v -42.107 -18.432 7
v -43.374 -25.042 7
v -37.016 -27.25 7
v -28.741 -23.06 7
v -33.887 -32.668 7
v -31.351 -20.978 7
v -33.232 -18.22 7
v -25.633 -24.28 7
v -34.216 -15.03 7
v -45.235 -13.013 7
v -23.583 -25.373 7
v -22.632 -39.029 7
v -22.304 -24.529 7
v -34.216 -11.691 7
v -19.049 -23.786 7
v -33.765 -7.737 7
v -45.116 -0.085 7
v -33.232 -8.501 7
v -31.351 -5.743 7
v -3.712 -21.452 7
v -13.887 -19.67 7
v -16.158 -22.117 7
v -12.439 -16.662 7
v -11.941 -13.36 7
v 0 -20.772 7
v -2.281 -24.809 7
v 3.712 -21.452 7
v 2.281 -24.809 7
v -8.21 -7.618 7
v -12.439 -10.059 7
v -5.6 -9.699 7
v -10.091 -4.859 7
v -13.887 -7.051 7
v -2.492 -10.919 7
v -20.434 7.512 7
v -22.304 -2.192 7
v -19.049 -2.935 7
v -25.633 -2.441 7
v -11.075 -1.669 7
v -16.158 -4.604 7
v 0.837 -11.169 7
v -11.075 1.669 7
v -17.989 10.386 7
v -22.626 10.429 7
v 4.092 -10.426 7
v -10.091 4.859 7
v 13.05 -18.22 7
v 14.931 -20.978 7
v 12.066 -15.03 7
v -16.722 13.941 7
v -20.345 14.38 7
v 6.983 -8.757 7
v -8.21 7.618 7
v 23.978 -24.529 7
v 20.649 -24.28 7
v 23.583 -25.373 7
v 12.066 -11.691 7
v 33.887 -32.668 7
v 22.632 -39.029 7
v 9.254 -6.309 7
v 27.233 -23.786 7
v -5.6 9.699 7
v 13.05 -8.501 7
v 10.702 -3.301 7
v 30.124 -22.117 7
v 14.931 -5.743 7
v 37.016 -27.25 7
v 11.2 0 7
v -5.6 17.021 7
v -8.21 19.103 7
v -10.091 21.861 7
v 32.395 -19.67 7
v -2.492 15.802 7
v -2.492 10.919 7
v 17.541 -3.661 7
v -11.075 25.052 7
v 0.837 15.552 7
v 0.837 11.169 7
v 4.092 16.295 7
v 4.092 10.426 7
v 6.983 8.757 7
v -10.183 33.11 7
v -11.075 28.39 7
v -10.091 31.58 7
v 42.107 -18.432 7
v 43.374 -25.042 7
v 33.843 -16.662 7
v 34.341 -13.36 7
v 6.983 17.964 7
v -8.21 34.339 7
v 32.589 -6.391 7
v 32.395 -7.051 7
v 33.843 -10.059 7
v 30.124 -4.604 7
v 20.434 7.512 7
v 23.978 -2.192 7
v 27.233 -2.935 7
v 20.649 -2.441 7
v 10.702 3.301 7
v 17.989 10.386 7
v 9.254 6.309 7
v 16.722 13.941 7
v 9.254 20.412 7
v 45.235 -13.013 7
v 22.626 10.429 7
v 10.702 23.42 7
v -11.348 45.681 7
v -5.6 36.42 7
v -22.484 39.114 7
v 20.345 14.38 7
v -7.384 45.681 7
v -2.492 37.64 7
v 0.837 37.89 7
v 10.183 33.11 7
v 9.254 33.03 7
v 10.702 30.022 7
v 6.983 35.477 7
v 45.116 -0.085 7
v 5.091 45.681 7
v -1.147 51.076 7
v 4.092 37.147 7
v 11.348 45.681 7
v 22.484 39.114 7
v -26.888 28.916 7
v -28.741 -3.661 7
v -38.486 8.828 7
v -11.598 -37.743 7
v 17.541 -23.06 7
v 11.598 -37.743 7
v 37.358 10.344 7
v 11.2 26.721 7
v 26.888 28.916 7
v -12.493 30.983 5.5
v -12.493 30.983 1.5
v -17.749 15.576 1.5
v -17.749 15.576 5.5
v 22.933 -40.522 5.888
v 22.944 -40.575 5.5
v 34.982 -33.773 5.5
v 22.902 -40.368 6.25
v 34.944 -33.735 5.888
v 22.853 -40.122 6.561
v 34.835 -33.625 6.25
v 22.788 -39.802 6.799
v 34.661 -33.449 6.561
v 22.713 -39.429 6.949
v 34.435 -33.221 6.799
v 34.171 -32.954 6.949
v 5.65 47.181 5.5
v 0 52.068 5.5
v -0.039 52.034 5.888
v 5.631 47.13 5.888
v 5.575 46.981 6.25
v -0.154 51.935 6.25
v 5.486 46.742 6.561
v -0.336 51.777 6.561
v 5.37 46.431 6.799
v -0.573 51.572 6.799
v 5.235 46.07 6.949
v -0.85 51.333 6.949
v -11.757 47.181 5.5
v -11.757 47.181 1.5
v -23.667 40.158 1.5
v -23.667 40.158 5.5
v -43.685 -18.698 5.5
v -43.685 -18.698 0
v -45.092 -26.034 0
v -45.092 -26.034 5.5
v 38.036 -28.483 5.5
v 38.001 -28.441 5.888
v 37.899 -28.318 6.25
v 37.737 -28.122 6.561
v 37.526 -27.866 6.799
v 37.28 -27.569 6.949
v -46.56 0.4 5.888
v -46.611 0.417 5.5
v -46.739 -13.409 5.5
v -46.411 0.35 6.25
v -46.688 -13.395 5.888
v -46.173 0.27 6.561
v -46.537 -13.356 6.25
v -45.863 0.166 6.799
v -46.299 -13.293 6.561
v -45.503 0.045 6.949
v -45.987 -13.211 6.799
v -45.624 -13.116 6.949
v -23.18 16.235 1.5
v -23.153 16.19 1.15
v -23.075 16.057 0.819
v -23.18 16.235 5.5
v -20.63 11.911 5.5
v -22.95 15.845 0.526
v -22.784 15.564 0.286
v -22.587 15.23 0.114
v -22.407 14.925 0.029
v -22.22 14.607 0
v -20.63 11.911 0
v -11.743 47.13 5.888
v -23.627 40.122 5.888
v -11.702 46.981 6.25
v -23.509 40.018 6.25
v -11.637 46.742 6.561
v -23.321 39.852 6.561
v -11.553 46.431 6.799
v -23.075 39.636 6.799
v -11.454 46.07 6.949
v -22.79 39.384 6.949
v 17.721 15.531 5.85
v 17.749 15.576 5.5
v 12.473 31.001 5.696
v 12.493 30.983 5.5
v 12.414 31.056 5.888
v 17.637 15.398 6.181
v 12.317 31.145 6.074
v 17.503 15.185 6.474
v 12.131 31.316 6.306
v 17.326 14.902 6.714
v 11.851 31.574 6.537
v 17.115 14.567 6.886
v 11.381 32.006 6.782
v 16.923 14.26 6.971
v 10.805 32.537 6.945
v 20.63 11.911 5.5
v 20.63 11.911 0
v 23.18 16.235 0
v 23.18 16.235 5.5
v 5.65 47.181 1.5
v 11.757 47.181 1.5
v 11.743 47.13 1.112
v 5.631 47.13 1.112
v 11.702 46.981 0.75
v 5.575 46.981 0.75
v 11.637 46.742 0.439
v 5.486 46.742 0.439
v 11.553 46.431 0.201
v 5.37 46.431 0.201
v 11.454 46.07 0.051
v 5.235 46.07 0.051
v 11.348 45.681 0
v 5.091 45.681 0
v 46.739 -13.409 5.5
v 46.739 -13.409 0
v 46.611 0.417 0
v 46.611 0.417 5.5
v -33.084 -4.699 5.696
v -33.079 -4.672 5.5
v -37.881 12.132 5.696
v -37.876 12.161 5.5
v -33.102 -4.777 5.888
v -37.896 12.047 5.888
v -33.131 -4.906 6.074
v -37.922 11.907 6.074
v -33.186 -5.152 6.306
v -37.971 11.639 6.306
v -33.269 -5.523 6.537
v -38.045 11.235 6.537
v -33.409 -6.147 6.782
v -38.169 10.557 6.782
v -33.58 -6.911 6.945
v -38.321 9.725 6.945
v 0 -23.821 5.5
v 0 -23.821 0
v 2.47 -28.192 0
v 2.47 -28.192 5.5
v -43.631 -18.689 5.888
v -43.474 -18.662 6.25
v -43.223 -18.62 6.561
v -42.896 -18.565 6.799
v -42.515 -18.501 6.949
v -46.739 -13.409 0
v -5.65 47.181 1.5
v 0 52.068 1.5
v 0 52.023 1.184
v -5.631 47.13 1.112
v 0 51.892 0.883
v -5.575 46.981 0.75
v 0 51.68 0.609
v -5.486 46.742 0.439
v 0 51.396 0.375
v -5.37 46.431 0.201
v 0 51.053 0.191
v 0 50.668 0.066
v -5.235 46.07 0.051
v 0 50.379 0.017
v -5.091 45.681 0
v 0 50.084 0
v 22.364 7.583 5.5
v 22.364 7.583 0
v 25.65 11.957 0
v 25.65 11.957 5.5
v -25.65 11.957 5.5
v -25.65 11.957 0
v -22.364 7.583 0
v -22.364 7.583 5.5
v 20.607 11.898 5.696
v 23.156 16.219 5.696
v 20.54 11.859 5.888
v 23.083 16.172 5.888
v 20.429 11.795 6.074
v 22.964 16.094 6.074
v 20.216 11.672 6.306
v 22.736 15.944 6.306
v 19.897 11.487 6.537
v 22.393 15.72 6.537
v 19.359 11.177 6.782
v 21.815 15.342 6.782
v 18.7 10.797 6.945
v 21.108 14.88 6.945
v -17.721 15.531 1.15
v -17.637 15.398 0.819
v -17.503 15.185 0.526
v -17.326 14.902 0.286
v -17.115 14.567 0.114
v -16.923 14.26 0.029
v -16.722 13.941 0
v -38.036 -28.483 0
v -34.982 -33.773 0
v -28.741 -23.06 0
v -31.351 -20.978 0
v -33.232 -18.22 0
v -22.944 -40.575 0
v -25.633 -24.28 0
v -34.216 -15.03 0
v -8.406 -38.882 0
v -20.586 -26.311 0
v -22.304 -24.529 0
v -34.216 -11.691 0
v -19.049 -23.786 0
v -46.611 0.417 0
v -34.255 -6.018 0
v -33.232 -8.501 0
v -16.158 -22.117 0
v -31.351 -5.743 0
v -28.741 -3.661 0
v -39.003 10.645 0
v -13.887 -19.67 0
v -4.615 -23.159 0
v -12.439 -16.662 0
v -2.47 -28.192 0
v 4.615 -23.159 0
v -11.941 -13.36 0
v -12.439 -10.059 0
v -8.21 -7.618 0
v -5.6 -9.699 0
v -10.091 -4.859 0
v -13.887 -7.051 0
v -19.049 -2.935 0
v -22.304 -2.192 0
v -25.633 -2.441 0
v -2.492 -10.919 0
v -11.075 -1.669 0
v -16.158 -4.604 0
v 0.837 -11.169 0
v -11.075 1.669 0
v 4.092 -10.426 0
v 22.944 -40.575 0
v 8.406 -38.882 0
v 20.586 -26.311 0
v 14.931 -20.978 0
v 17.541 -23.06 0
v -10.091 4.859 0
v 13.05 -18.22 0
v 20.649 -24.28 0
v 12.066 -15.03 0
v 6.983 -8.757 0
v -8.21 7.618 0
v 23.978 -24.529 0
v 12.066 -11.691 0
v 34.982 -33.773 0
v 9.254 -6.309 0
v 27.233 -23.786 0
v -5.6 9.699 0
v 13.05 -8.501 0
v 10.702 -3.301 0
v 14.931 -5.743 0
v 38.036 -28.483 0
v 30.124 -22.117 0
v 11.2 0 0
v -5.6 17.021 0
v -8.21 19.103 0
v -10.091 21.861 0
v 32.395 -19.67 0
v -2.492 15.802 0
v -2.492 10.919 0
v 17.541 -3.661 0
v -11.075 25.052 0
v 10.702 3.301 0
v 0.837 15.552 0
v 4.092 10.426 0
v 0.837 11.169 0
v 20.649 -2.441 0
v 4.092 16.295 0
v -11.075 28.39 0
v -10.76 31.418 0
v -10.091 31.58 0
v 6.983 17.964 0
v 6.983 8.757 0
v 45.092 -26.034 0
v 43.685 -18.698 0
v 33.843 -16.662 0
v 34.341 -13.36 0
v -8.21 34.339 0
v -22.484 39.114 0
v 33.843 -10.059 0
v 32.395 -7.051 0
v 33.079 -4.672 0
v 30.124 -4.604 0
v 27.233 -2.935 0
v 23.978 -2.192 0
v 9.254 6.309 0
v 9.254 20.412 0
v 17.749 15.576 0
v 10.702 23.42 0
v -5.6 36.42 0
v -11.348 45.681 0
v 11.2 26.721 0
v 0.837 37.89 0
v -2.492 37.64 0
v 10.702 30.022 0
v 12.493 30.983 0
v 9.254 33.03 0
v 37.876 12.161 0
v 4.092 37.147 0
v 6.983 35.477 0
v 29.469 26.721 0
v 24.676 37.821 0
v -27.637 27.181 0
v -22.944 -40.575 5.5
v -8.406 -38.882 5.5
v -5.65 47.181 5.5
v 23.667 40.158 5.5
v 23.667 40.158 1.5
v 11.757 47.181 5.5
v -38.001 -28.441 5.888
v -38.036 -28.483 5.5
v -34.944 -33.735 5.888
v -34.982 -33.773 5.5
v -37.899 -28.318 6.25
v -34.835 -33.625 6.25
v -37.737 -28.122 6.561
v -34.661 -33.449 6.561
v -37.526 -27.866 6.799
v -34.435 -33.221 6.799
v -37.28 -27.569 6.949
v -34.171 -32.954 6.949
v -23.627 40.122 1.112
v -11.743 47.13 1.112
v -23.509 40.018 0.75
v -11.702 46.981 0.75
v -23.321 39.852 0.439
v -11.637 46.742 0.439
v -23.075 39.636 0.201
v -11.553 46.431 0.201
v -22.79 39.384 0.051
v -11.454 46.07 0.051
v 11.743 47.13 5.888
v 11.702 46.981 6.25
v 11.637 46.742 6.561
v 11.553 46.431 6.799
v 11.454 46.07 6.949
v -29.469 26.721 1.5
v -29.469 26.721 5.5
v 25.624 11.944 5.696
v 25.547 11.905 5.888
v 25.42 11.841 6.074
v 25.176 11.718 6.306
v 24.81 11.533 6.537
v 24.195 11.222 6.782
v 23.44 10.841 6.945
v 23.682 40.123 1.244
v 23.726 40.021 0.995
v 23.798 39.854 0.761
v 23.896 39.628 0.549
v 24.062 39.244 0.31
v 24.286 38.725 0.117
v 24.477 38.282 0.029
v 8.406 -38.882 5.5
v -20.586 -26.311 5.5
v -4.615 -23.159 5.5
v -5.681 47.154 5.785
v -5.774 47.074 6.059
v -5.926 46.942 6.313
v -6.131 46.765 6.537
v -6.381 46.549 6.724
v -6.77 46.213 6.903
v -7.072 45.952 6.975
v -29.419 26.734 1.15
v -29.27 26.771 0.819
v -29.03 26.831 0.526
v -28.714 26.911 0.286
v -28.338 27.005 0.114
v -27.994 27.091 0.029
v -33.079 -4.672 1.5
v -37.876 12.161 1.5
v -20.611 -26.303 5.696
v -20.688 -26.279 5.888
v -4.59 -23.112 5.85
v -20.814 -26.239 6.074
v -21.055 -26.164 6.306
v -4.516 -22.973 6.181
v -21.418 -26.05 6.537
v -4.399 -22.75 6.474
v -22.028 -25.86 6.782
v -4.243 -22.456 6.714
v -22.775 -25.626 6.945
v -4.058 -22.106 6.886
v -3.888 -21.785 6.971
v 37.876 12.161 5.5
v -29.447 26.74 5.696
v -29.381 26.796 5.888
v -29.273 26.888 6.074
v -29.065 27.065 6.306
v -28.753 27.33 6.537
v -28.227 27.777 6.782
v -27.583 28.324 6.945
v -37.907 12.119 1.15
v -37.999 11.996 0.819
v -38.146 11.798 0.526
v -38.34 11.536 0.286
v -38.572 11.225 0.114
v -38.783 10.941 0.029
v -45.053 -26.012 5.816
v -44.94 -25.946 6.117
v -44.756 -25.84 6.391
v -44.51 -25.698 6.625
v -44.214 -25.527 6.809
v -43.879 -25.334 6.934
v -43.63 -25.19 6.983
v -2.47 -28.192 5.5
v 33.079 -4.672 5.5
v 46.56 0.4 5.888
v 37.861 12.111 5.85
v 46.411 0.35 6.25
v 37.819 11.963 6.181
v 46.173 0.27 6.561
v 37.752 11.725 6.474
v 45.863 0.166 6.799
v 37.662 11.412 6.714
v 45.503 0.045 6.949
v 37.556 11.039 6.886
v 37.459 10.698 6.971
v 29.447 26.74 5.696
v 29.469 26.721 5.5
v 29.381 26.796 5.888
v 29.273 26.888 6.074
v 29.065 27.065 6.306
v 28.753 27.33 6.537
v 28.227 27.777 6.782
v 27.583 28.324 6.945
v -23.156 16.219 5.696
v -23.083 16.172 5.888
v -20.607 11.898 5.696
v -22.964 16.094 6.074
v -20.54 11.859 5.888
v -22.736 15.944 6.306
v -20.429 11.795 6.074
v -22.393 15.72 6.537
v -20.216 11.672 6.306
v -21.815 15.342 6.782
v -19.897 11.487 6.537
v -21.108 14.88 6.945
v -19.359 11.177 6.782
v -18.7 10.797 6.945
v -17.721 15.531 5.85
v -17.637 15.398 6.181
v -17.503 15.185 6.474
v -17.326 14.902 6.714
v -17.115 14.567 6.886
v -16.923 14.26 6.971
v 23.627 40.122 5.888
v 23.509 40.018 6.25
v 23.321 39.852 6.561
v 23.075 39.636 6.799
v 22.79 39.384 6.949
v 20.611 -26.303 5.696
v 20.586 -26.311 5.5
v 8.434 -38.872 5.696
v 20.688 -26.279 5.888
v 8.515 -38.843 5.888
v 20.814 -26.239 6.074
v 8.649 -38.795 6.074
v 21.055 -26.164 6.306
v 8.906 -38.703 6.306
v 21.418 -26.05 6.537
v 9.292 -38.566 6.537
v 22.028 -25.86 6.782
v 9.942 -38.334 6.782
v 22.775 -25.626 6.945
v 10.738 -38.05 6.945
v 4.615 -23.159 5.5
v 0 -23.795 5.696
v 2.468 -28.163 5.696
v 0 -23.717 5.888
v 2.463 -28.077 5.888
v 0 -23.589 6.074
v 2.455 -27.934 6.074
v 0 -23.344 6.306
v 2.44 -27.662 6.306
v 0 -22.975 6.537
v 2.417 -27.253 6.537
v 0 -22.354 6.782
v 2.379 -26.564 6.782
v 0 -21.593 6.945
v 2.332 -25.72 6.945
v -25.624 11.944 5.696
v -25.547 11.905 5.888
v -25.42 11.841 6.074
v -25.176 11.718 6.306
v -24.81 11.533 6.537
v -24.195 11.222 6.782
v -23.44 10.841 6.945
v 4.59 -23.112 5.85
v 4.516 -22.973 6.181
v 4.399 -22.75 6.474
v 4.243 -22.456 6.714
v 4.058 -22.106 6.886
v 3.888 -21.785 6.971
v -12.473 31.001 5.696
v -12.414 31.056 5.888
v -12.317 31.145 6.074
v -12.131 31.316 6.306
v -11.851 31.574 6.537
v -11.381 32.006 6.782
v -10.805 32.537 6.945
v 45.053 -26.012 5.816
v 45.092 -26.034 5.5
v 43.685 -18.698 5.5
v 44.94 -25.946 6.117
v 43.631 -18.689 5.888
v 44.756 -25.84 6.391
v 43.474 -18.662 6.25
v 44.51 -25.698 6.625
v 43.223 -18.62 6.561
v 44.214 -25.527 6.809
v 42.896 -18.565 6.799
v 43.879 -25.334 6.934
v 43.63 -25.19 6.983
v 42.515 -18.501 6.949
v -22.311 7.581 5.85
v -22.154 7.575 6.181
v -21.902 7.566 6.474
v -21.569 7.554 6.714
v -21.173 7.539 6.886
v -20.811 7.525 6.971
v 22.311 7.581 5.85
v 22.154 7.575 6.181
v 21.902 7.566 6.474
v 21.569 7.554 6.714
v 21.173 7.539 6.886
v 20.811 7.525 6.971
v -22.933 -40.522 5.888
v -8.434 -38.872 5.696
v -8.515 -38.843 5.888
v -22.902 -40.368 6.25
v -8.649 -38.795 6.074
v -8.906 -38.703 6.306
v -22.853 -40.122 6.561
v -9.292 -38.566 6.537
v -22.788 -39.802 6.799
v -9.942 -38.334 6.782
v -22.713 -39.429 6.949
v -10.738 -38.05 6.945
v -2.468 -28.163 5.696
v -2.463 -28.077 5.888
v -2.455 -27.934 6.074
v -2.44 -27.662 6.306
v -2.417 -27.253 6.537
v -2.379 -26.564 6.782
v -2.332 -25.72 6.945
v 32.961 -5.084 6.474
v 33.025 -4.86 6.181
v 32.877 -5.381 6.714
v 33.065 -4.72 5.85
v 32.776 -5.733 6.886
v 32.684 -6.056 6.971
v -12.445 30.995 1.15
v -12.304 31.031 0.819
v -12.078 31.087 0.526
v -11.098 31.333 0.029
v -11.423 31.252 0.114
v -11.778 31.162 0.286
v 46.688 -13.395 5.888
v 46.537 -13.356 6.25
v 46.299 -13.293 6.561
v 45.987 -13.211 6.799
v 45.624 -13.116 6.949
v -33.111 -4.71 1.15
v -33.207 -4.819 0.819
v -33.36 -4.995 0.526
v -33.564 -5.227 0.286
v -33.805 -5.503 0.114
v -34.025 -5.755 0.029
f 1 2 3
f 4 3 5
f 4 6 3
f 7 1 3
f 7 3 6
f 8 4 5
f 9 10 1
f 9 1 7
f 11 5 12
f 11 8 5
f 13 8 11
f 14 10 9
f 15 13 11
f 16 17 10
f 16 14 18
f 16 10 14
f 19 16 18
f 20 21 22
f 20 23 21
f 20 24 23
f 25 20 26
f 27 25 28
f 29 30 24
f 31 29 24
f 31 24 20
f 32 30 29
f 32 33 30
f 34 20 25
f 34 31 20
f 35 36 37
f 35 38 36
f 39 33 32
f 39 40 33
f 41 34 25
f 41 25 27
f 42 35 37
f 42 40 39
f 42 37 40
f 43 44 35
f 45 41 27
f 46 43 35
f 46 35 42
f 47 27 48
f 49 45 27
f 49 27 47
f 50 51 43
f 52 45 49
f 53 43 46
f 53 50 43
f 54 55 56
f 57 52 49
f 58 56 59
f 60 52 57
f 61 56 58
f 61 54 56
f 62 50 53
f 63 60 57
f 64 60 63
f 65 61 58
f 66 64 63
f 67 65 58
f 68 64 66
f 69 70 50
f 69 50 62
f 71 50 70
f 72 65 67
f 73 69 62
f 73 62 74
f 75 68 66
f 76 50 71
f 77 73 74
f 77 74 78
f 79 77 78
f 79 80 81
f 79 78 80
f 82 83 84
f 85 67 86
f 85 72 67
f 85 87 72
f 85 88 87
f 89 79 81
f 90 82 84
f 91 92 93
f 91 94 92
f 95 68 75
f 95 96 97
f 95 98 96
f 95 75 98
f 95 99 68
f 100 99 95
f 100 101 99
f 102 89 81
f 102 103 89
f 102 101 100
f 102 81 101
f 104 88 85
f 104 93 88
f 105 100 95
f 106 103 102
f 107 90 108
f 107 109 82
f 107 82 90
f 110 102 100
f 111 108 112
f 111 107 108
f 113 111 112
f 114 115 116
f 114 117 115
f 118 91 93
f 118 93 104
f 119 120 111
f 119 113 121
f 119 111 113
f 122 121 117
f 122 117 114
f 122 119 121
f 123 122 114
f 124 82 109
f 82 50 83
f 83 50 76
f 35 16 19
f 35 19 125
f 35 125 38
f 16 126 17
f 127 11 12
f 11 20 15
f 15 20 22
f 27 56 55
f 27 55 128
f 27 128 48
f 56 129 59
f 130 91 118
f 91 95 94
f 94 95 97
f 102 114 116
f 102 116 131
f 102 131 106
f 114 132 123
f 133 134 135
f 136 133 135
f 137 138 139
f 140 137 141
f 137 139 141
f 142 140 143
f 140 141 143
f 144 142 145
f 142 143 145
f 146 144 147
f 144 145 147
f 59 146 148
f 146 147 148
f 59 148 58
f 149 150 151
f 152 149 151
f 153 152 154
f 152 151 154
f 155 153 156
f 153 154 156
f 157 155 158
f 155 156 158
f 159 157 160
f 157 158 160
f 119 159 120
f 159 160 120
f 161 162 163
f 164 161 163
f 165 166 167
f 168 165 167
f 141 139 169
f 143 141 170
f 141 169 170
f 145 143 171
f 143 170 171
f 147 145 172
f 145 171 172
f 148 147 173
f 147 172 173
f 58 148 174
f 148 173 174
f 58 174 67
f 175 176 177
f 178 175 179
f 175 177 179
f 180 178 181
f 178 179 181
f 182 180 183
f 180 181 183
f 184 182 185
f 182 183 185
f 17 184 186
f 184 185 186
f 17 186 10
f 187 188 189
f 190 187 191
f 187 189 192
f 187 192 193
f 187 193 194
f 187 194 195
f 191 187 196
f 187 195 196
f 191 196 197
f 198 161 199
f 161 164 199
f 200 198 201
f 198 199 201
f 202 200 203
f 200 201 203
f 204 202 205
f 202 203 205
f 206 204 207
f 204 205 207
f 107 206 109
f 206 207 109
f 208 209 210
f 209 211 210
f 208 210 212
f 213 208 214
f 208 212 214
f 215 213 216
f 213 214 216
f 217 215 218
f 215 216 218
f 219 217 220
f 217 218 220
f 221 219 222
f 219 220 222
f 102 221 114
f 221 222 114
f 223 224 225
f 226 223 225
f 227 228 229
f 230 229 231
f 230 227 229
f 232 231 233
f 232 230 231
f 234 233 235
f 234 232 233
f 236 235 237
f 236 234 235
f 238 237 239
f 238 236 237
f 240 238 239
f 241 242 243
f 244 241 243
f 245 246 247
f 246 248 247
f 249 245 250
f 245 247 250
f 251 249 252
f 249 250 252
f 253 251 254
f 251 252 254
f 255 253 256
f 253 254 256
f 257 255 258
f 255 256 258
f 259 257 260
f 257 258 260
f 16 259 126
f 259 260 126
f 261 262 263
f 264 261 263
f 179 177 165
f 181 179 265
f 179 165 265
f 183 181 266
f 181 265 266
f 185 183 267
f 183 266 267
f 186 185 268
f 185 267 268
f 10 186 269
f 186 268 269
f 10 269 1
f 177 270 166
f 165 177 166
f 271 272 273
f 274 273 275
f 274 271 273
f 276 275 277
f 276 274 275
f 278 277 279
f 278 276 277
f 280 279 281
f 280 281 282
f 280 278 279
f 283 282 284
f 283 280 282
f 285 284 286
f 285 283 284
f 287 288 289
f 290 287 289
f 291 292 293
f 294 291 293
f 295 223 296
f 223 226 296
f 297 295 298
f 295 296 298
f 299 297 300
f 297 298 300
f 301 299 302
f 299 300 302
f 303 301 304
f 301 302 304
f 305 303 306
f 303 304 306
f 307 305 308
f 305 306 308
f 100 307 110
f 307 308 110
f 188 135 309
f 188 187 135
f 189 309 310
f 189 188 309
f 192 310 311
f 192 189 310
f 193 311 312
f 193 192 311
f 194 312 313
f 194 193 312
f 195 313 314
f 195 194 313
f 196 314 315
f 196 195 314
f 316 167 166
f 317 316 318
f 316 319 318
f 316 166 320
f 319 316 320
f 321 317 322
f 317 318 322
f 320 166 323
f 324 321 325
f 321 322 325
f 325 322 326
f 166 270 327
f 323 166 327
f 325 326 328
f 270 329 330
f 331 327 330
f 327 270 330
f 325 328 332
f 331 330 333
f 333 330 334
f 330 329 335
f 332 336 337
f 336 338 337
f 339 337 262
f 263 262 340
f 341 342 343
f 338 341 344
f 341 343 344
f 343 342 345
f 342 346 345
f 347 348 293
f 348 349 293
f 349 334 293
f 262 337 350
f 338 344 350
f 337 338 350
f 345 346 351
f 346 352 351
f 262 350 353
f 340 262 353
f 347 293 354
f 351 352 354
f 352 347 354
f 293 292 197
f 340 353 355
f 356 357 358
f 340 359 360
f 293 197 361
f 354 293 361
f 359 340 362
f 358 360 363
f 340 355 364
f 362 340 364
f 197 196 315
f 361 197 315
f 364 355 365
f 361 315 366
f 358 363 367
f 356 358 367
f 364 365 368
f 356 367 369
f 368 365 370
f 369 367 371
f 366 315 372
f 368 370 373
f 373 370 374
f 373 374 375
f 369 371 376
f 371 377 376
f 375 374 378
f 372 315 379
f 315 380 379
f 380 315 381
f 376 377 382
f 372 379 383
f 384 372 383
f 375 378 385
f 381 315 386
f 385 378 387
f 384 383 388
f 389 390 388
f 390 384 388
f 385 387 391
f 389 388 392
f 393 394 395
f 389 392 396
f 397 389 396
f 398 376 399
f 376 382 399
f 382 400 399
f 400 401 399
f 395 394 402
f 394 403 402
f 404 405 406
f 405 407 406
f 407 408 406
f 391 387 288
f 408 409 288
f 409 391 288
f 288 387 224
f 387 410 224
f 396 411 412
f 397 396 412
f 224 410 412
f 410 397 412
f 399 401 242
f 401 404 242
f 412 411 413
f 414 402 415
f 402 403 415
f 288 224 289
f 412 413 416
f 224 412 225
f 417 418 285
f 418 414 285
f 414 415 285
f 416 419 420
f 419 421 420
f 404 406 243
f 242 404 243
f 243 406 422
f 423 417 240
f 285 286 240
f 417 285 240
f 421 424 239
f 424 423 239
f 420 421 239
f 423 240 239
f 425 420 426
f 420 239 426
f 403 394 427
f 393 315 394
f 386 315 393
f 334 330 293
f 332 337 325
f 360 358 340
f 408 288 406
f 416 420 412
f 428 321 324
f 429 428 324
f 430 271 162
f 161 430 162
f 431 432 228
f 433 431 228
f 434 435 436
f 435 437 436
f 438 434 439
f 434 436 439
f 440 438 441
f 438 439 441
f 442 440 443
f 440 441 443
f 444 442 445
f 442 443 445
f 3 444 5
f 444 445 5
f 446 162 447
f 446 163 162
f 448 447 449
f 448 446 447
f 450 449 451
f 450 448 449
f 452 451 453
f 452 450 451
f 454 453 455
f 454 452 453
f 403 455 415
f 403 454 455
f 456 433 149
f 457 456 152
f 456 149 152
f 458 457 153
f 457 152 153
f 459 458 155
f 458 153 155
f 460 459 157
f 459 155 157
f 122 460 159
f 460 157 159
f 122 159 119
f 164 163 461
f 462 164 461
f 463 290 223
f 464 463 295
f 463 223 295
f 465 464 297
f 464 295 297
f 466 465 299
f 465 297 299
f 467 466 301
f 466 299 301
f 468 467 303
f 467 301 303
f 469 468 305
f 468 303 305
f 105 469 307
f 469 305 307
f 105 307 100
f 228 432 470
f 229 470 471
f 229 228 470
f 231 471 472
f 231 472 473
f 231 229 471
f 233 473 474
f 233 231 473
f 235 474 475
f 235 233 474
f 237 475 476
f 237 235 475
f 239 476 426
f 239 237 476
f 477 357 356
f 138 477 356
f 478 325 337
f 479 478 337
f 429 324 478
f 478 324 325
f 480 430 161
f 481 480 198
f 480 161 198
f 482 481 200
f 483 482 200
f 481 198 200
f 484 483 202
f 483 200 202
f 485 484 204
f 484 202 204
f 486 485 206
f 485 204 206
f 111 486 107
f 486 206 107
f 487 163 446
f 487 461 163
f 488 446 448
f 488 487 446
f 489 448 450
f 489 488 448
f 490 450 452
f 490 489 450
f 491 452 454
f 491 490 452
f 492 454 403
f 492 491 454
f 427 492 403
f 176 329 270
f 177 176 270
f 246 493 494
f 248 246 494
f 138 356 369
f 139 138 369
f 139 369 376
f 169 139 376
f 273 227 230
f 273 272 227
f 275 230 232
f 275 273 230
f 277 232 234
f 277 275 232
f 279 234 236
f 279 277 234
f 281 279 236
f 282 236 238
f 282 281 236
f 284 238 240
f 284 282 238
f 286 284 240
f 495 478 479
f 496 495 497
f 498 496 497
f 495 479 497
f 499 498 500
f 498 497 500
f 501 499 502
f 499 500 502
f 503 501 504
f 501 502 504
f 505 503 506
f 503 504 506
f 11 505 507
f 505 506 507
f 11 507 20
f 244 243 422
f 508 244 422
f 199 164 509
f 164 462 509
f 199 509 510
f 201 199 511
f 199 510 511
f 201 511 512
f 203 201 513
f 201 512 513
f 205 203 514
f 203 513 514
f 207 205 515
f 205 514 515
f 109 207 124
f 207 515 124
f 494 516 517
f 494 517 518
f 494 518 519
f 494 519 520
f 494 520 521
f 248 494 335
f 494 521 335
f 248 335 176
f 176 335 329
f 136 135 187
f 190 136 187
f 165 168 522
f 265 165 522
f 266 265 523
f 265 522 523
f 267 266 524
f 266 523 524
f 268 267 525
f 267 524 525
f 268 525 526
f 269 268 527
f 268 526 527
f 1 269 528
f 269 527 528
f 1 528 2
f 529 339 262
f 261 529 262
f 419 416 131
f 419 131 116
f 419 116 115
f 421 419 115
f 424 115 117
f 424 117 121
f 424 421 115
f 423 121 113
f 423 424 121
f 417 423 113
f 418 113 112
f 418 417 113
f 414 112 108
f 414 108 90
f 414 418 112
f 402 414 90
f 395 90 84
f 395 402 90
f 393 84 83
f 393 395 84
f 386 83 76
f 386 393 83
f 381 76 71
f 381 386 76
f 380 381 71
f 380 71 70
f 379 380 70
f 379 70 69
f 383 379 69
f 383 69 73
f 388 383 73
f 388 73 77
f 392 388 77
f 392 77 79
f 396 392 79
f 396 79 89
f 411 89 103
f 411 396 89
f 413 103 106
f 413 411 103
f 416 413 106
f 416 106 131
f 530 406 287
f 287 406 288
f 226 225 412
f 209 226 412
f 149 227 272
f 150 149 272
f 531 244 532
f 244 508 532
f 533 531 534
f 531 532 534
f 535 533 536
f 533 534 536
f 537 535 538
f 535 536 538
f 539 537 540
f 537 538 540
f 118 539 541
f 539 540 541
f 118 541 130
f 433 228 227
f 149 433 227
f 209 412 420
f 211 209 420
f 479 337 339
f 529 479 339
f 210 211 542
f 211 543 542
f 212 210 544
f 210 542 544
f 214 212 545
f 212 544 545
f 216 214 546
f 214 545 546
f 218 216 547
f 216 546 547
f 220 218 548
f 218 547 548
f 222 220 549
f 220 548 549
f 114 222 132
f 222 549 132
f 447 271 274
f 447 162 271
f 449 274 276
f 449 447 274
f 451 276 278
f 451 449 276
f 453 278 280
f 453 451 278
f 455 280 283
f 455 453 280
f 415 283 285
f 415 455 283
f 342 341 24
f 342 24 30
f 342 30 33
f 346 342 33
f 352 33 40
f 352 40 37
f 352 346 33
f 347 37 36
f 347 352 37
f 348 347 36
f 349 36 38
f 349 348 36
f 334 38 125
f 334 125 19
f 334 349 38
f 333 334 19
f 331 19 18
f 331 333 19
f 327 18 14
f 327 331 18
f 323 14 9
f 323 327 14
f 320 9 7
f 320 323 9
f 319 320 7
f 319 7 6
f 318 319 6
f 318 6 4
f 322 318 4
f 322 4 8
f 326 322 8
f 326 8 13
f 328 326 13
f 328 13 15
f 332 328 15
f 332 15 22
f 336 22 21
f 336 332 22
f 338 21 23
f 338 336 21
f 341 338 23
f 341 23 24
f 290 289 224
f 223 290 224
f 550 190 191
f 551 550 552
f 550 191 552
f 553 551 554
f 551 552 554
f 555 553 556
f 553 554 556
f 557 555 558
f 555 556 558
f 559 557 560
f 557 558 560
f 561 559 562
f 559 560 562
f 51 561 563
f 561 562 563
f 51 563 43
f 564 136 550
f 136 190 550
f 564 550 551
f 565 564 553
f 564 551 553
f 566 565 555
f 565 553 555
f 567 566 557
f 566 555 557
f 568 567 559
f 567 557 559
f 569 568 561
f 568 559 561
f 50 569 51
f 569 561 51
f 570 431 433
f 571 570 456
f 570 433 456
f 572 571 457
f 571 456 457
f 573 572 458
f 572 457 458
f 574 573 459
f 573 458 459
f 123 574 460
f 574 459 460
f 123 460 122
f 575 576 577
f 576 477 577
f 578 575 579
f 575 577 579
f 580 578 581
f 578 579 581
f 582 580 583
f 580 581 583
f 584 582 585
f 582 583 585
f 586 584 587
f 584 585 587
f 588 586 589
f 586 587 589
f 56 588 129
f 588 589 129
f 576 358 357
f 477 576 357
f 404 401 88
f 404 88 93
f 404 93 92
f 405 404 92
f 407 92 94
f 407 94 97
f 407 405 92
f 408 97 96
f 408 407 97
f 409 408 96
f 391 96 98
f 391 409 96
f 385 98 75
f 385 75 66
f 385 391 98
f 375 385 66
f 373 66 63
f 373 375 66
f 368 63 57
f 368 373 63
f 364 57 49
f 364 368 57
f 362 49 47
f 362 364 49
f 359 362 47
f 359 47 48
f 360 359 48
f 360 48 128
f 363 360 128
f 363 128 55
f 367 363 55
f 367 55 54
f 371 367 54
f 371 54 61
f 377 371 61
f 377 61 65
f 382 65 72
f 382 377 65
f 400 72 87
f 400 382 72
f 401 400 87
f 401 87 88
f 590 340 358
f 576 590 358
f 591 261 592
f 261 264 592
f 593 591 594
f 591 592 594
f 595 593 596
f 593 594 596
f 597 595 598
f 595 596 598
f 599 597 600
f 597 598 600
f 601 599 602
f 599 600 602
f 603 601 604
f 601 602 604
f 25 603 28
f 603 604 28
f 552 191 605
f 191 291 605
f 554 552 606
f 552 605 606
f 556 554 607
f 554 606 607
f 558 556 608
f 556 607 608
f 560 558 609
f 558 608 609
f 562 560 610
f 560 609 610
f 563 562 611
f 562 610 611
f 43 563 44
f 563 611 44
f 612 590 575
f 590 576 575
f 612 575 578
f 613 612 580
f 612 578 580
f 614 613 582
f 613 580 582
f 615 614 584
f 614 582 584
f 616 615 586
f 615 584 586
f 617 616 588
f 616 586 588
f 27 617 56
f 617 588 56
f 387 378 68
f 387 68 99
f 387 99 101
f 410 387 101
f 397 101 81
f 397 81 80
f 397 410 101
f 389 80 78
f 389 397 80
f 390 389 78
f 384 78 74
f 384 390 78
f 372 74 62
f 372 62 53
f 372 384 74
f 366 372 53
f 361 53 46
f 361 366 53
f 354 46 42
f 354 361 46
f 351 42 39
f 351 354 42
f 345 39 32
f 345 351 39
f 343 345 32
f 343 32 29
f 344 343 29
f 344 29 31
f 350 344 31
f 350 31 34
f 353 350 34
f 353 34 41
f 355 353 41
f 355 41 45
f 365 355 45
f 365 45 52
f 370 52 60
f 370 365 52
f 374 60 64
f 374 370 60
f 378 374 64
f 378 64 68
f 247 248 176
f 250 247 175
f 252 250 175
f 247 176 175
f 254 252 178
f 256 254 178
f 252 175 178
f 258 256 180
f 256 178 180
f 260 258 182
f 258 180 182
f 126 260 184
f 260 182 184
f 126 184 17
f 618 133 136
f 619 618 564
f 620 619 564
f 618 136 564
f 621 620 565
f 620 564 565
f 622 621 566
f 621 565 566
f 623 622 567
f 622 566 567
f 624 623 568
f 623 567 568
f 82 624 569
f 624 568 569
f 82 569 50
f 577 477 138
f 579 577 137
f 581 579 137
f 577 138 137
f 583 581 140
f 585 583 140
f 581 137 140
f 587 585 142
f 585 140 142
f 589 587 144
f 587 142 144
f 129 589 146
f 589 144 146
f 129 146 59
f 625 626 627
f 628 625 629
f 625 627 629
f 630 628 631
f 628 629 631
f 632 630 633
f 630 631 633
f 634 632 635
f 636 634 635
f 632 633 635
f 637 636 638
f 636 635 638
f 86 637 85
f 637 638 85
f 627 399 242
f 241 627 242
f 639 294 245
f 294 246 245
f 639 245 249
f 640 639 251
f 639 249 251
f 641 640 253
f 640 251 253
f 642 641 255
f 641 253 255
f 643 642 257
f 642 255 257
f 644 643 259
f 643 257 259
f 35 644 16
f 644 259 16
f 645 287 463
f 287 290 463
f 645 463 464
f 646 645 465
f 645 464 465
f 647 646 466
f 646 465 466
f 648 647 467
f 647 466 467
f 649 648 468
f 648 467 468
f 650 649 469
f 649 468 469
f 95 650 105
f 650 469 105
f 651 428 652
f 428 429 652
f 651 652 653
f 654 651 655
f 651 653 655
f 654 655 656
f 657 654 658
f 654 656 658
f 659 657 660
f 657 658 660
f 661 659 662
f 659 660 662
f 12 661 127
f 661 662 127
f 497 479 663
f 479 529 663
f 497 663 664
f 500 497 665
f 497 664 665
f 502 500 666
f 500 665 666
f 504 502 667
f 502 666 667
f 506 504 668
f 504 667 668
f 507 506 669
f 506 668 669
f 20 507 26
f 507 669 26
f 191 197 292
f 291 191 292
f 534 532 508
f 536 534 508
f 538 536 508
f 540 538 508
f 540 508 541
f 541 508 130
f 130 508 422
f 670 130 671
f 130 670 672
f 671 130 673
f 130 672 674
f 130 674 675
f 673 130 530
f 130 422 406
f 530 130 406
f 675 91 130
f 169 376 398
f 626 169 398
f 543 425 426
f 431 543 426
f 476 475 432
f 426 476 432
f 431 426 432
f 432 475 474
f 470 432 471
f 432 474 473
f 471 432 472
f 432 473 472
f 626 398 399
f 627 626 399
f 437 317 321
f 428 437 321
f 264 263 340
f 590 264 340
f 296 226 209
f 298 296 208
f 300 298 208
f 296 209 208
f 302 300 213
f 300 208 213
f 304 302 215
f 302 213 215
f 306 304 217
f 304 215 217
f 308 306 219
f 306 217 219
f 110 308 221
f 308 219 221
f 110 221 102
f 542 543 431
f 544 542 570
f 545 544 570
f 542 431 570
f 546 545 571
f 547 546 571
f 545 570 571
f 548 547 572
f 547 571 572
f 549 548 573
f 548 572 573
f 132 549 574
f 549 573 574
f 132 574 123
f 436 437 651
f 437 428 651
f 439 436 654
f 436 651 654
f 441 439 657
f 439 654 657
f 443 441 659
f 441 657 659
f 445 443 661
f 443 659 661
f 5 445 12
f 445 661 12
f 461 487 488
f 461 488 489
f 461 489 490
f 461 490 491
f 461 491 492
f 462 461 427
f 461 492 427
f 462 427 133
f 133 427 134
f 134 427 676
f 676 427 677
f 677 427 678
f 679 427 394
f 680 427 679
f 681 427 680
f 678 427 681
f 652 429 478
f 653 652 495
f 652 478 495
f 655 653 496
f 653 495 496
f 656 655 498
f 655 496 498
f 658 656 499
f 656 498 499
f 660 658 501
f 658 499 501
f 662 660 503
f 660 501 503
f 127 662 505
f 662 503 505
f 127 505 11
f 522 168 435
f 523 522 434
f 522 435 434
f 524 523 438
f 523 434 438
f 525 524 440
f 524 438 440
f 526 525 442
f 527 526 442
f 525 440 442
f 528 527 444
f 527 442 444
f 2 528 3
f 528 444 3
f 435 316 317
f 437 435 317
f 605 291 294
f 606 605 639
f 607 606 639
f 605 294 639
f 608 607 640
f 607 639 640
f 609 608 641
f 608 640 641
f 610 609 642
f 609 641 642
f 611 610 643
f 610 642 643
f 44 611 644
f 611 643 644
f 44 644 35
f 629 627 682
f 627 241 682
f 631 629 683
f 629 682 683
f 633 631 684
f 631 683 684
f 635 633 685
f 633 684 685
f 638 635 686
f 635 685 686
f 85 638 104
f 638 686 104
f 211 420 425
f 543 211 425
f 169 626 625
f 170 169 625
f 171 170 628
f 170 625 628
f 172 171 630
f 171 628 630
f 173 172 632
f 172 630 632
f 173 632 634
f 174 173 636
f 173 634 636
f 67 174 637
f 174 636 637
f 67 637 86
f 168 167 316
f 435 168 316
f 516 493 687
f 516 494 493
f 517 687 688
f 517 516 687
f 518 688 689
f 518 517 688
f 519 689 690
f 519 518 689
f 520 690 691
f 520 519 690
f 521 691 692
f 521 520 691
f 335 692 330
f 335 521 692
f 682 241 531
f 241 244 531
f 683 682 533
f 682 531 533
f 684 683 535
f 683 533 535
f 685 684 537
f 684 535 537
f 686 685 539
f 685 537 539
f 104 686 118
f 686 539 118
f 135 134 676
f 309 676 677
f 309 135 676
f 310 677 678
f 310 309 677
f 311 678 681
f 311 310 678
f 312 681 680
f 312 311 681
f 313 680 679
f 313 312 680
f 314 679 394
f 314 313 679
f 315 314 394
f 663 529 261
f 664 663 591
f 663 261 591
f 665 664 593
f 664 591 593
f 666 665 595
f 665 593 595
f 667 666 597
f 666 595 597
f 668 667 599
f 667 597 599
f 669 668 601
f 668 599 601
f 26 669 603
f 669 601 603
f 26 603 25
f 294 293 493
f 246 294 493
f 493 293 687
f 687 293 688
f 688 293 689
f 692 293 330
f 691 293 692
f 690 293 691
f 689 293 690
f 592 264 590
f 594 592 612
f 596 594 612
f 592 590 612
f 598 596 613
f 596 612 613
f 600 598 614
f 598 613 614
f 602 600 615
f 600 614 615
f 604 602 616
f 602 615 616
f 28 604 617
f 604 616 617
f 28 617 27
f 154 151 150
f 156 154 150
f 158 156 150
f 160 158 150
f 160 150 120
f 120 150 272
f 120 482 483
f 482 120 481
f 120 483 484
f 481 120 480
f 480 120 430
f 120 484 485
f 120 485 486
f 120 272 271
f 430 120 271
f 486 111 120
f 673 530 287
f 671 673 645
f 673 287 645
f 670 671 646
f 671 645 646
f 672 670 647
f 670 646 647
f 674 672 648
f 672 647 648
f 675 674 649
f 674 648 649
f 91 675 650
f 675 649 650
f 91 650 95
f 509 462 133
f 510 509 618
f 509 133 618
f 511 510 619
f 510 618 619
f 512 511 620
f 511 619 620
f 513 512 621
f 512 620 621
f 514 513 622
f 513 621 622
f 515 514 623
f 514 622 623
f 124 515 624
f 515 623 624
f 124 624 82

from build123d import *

# Parameters (mm, degrees)
F0_R     = 11.2
F1_DEPTH = 7
F2_R     = 1.5


with BuildPart() as f1:
    # F0 (on Top) → F1 (new body)
    with BuildSketch(Plane.XY):
        Polygon((-29.469332, 26.720898), (-12.492945, 30.983096), (-17.749237, 15.576357), (-23.179901, 16.234838), (-20.629681, 11.910552), (-25.649733, 11.956964), (-22.364139, 7.583111), (-33.07862, -4.67234), (-37.875643, 12.160741), (-46.611124, 0.417446), (-46.738951, -13.408707), (-43.685134, -18.698073), (-45.091842, -26.033787), (-38.035573, -28.483399), (-34.981756, -33.772766), (-22.944043, -40.57514), (-8.406311, -38.881639), (-20.585675, -26.310756), (-4.614902, -23.159468), (-2.469832, -28.191802), (0, -23.821104), (2.469832, -28.191802), (4.614902, -23.159468), (20.585675, -26.310756), (8.406311, -38.881639), (22.944043, -40.57514), (34.981756, -33.772766), (38.035573, -28.483399), (45.091842, -26.033787), (43.685134, -18.698073), (46.738951, -13.408707), (46.611124, 0.417446), (37.875643, 12.160741), (33.07862, -4.67234), (22.364139, 7.583111), (25.649733, 11.956964), (20.629681, 11.910552), (23.179901, 16.234838), (17.749237, 15.576357), (12.492945, 30.983096), (29.469332, 26.720898), (23.66708, 40.157694), (11.757195, 47.181472), (5.649561, 47.181472), (0, 52.067574), (-5.649561, 47.181472), (-11.757195, 47.181472), (-23.66708, 40.157694), align=None)
        with Locations((-23.140977, -13.360449)):
            Circle(F0_R, mode=Mode.SUBTRACT)
        with Locations((23.140977, -13.360449)):
            Circle(F0_R, mode=Mode.SUBTRACT)
        Circle(F0_R, mode=Mode.SUBTRACT)
        with Locations((0, 26.720898)):
            Circle(F0_R, mode=Mode.SUBTRACT)
    extrude(amount=F1_DEPTH)

    # F2
    f2_edges = [f1.edges().sort_by_distance(p)[0] for p in [
        (20.981138, 28.851997, 7),
        (26.568206, 33.439296, 7),
        (17.712138, 43.669583, 7),
        (8.703378, 47.181472, 7),
        (2.824781, 49.624523, 7),
        (-8.703378, 47.181472, 7),
        (-17.712138, 43.669583, 7),
        (-26.568206, 33.439296, 7),
        (-20.981138, 28.851997, 7),
        (-15.121091, 23.279726, 7),
        (-20.464569, 15.905597, 7),
        (-27.72138, 1.455386, 7),
        (-23.139707, 11.933758, 7),
        (-21.904791, 14.072695, 7),
        (-24.006936, 9.770038, 7),
        (-35.477131, 3.7442, 7),
        (-42.243383, 6.289093, 7),
        (-46.675037, -6.49563, 7),
        (-45.212043, -16.05339, 7),
        (-44.388488, -22.36593, 7),
        (-41.563707, -27.258593, 7),
        (-28.9629, -37.173953, 7),
        (-15.675177, -39.72839, 7),
        (-36.508664, -31.128083, 7),
        (-14.495993, -32.596197, 7),
        (-12.600289, -24.735112, 7),
        (-3.542367, -25.675635, 7),
        (12.600289, -24.735112, 7),
        (14.495993, -32.596197, 7),
        (3.542367, -25.675635, 7),
        (15.675177, -39.72839, 7),
        (-1.234916, -26.006453, 7),
        (1.234916, -26.006453, 7),
        (28.9629, -37.173953, 7),
        (36.508664, -31.128083, 7),
        (41.563707, -27.258593, 7),
        (44.388488, -22.36593, 7),
        (45.212043, -16.05339, 7),
        (46.675037, -6.49563, 7),
        (42.243383, 6.289093, 7),
        (27.72138, 1.455386, 7),
        (24.006936, 9.770038, 7),
        (20.464569, 15.905597, 7),
        (15.121091, 23.279726, 7),
        (23.139707, 11.933758, 7),
        (21.904791, 14.072695, 7),
        (17.712138, 43.669583, 0),
        (8.703378, 47.181472, 0),
        (2.824781, 49.624523, 0),
        (-8.703378, 47.181472, 0),
        (-17.712138, 43.669583, 0),
        (-2.824781, 49.624523, 0),
        (-26.568206, 33.439296, 0),
        (-15.121091, 23.279726, 0),
        (-20.464569, 15.905597, 0),
        (-35.477131, 3.7442, 0),
    ]]
    fillet(f2_edges, radius=F2_R)


solid = f1.part
